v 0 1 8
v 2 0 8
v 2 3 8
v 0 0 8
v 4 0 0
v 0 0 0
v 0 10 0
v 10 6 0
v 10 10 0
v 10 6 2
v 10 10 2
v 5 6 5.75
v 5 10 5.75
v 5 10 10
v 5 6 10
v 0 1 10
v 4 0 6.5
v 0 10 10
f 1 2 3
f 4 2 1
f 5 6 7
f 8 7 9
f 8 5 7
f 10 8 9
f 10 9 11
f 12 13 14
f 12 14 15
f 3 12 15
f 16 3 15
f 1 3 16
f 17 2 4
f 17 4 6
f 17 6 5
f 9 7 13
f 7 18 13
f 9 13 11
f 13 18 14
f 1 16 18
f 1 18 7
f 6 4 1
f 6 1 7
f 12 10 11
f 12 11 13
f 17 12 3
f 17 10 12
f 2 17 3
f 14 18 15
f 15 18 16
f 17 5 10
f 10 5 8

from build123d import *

# Parameters (mm, degrees)
F1_DEPTH = 10
F3_DEPTH = 8.001
F4_DEPTH = 10


with BuildPart() as f1:
    # F0 (on Front) → F1 (new body)
    with BuildSketch(Plane.XZ):
        Polygon((2, 8), (0, 8), (0, 0), (10, 0), (10, 2), align=None)
    extrude(amount=-F1_DEPTH)

    # F2 (on face) → F3 (cut, through all)
    with BuildSketch(Plane(origin=(0, 0, 0), x_dir=(1, 0, 0), z_dir=(0, 0, -1))):
        Polygon((10, 0), (4, 0), (10, -6), align=None)
    extrude(amount=-F3_DEPTH, mode=Mode.SUBTRACT)

    # F2 (on face) → F4 (join)
    with BuildSketch(Plane(origin=(0, 0, 0), x_dir=(1, 0, 0), z_dir=(0, 0, -1))):
        Polygon((5, -6), (0, -1), (0, -10), (5, -10), align=None)
    extrude(amount=-F4_DEPTH)


solid = f1.part
